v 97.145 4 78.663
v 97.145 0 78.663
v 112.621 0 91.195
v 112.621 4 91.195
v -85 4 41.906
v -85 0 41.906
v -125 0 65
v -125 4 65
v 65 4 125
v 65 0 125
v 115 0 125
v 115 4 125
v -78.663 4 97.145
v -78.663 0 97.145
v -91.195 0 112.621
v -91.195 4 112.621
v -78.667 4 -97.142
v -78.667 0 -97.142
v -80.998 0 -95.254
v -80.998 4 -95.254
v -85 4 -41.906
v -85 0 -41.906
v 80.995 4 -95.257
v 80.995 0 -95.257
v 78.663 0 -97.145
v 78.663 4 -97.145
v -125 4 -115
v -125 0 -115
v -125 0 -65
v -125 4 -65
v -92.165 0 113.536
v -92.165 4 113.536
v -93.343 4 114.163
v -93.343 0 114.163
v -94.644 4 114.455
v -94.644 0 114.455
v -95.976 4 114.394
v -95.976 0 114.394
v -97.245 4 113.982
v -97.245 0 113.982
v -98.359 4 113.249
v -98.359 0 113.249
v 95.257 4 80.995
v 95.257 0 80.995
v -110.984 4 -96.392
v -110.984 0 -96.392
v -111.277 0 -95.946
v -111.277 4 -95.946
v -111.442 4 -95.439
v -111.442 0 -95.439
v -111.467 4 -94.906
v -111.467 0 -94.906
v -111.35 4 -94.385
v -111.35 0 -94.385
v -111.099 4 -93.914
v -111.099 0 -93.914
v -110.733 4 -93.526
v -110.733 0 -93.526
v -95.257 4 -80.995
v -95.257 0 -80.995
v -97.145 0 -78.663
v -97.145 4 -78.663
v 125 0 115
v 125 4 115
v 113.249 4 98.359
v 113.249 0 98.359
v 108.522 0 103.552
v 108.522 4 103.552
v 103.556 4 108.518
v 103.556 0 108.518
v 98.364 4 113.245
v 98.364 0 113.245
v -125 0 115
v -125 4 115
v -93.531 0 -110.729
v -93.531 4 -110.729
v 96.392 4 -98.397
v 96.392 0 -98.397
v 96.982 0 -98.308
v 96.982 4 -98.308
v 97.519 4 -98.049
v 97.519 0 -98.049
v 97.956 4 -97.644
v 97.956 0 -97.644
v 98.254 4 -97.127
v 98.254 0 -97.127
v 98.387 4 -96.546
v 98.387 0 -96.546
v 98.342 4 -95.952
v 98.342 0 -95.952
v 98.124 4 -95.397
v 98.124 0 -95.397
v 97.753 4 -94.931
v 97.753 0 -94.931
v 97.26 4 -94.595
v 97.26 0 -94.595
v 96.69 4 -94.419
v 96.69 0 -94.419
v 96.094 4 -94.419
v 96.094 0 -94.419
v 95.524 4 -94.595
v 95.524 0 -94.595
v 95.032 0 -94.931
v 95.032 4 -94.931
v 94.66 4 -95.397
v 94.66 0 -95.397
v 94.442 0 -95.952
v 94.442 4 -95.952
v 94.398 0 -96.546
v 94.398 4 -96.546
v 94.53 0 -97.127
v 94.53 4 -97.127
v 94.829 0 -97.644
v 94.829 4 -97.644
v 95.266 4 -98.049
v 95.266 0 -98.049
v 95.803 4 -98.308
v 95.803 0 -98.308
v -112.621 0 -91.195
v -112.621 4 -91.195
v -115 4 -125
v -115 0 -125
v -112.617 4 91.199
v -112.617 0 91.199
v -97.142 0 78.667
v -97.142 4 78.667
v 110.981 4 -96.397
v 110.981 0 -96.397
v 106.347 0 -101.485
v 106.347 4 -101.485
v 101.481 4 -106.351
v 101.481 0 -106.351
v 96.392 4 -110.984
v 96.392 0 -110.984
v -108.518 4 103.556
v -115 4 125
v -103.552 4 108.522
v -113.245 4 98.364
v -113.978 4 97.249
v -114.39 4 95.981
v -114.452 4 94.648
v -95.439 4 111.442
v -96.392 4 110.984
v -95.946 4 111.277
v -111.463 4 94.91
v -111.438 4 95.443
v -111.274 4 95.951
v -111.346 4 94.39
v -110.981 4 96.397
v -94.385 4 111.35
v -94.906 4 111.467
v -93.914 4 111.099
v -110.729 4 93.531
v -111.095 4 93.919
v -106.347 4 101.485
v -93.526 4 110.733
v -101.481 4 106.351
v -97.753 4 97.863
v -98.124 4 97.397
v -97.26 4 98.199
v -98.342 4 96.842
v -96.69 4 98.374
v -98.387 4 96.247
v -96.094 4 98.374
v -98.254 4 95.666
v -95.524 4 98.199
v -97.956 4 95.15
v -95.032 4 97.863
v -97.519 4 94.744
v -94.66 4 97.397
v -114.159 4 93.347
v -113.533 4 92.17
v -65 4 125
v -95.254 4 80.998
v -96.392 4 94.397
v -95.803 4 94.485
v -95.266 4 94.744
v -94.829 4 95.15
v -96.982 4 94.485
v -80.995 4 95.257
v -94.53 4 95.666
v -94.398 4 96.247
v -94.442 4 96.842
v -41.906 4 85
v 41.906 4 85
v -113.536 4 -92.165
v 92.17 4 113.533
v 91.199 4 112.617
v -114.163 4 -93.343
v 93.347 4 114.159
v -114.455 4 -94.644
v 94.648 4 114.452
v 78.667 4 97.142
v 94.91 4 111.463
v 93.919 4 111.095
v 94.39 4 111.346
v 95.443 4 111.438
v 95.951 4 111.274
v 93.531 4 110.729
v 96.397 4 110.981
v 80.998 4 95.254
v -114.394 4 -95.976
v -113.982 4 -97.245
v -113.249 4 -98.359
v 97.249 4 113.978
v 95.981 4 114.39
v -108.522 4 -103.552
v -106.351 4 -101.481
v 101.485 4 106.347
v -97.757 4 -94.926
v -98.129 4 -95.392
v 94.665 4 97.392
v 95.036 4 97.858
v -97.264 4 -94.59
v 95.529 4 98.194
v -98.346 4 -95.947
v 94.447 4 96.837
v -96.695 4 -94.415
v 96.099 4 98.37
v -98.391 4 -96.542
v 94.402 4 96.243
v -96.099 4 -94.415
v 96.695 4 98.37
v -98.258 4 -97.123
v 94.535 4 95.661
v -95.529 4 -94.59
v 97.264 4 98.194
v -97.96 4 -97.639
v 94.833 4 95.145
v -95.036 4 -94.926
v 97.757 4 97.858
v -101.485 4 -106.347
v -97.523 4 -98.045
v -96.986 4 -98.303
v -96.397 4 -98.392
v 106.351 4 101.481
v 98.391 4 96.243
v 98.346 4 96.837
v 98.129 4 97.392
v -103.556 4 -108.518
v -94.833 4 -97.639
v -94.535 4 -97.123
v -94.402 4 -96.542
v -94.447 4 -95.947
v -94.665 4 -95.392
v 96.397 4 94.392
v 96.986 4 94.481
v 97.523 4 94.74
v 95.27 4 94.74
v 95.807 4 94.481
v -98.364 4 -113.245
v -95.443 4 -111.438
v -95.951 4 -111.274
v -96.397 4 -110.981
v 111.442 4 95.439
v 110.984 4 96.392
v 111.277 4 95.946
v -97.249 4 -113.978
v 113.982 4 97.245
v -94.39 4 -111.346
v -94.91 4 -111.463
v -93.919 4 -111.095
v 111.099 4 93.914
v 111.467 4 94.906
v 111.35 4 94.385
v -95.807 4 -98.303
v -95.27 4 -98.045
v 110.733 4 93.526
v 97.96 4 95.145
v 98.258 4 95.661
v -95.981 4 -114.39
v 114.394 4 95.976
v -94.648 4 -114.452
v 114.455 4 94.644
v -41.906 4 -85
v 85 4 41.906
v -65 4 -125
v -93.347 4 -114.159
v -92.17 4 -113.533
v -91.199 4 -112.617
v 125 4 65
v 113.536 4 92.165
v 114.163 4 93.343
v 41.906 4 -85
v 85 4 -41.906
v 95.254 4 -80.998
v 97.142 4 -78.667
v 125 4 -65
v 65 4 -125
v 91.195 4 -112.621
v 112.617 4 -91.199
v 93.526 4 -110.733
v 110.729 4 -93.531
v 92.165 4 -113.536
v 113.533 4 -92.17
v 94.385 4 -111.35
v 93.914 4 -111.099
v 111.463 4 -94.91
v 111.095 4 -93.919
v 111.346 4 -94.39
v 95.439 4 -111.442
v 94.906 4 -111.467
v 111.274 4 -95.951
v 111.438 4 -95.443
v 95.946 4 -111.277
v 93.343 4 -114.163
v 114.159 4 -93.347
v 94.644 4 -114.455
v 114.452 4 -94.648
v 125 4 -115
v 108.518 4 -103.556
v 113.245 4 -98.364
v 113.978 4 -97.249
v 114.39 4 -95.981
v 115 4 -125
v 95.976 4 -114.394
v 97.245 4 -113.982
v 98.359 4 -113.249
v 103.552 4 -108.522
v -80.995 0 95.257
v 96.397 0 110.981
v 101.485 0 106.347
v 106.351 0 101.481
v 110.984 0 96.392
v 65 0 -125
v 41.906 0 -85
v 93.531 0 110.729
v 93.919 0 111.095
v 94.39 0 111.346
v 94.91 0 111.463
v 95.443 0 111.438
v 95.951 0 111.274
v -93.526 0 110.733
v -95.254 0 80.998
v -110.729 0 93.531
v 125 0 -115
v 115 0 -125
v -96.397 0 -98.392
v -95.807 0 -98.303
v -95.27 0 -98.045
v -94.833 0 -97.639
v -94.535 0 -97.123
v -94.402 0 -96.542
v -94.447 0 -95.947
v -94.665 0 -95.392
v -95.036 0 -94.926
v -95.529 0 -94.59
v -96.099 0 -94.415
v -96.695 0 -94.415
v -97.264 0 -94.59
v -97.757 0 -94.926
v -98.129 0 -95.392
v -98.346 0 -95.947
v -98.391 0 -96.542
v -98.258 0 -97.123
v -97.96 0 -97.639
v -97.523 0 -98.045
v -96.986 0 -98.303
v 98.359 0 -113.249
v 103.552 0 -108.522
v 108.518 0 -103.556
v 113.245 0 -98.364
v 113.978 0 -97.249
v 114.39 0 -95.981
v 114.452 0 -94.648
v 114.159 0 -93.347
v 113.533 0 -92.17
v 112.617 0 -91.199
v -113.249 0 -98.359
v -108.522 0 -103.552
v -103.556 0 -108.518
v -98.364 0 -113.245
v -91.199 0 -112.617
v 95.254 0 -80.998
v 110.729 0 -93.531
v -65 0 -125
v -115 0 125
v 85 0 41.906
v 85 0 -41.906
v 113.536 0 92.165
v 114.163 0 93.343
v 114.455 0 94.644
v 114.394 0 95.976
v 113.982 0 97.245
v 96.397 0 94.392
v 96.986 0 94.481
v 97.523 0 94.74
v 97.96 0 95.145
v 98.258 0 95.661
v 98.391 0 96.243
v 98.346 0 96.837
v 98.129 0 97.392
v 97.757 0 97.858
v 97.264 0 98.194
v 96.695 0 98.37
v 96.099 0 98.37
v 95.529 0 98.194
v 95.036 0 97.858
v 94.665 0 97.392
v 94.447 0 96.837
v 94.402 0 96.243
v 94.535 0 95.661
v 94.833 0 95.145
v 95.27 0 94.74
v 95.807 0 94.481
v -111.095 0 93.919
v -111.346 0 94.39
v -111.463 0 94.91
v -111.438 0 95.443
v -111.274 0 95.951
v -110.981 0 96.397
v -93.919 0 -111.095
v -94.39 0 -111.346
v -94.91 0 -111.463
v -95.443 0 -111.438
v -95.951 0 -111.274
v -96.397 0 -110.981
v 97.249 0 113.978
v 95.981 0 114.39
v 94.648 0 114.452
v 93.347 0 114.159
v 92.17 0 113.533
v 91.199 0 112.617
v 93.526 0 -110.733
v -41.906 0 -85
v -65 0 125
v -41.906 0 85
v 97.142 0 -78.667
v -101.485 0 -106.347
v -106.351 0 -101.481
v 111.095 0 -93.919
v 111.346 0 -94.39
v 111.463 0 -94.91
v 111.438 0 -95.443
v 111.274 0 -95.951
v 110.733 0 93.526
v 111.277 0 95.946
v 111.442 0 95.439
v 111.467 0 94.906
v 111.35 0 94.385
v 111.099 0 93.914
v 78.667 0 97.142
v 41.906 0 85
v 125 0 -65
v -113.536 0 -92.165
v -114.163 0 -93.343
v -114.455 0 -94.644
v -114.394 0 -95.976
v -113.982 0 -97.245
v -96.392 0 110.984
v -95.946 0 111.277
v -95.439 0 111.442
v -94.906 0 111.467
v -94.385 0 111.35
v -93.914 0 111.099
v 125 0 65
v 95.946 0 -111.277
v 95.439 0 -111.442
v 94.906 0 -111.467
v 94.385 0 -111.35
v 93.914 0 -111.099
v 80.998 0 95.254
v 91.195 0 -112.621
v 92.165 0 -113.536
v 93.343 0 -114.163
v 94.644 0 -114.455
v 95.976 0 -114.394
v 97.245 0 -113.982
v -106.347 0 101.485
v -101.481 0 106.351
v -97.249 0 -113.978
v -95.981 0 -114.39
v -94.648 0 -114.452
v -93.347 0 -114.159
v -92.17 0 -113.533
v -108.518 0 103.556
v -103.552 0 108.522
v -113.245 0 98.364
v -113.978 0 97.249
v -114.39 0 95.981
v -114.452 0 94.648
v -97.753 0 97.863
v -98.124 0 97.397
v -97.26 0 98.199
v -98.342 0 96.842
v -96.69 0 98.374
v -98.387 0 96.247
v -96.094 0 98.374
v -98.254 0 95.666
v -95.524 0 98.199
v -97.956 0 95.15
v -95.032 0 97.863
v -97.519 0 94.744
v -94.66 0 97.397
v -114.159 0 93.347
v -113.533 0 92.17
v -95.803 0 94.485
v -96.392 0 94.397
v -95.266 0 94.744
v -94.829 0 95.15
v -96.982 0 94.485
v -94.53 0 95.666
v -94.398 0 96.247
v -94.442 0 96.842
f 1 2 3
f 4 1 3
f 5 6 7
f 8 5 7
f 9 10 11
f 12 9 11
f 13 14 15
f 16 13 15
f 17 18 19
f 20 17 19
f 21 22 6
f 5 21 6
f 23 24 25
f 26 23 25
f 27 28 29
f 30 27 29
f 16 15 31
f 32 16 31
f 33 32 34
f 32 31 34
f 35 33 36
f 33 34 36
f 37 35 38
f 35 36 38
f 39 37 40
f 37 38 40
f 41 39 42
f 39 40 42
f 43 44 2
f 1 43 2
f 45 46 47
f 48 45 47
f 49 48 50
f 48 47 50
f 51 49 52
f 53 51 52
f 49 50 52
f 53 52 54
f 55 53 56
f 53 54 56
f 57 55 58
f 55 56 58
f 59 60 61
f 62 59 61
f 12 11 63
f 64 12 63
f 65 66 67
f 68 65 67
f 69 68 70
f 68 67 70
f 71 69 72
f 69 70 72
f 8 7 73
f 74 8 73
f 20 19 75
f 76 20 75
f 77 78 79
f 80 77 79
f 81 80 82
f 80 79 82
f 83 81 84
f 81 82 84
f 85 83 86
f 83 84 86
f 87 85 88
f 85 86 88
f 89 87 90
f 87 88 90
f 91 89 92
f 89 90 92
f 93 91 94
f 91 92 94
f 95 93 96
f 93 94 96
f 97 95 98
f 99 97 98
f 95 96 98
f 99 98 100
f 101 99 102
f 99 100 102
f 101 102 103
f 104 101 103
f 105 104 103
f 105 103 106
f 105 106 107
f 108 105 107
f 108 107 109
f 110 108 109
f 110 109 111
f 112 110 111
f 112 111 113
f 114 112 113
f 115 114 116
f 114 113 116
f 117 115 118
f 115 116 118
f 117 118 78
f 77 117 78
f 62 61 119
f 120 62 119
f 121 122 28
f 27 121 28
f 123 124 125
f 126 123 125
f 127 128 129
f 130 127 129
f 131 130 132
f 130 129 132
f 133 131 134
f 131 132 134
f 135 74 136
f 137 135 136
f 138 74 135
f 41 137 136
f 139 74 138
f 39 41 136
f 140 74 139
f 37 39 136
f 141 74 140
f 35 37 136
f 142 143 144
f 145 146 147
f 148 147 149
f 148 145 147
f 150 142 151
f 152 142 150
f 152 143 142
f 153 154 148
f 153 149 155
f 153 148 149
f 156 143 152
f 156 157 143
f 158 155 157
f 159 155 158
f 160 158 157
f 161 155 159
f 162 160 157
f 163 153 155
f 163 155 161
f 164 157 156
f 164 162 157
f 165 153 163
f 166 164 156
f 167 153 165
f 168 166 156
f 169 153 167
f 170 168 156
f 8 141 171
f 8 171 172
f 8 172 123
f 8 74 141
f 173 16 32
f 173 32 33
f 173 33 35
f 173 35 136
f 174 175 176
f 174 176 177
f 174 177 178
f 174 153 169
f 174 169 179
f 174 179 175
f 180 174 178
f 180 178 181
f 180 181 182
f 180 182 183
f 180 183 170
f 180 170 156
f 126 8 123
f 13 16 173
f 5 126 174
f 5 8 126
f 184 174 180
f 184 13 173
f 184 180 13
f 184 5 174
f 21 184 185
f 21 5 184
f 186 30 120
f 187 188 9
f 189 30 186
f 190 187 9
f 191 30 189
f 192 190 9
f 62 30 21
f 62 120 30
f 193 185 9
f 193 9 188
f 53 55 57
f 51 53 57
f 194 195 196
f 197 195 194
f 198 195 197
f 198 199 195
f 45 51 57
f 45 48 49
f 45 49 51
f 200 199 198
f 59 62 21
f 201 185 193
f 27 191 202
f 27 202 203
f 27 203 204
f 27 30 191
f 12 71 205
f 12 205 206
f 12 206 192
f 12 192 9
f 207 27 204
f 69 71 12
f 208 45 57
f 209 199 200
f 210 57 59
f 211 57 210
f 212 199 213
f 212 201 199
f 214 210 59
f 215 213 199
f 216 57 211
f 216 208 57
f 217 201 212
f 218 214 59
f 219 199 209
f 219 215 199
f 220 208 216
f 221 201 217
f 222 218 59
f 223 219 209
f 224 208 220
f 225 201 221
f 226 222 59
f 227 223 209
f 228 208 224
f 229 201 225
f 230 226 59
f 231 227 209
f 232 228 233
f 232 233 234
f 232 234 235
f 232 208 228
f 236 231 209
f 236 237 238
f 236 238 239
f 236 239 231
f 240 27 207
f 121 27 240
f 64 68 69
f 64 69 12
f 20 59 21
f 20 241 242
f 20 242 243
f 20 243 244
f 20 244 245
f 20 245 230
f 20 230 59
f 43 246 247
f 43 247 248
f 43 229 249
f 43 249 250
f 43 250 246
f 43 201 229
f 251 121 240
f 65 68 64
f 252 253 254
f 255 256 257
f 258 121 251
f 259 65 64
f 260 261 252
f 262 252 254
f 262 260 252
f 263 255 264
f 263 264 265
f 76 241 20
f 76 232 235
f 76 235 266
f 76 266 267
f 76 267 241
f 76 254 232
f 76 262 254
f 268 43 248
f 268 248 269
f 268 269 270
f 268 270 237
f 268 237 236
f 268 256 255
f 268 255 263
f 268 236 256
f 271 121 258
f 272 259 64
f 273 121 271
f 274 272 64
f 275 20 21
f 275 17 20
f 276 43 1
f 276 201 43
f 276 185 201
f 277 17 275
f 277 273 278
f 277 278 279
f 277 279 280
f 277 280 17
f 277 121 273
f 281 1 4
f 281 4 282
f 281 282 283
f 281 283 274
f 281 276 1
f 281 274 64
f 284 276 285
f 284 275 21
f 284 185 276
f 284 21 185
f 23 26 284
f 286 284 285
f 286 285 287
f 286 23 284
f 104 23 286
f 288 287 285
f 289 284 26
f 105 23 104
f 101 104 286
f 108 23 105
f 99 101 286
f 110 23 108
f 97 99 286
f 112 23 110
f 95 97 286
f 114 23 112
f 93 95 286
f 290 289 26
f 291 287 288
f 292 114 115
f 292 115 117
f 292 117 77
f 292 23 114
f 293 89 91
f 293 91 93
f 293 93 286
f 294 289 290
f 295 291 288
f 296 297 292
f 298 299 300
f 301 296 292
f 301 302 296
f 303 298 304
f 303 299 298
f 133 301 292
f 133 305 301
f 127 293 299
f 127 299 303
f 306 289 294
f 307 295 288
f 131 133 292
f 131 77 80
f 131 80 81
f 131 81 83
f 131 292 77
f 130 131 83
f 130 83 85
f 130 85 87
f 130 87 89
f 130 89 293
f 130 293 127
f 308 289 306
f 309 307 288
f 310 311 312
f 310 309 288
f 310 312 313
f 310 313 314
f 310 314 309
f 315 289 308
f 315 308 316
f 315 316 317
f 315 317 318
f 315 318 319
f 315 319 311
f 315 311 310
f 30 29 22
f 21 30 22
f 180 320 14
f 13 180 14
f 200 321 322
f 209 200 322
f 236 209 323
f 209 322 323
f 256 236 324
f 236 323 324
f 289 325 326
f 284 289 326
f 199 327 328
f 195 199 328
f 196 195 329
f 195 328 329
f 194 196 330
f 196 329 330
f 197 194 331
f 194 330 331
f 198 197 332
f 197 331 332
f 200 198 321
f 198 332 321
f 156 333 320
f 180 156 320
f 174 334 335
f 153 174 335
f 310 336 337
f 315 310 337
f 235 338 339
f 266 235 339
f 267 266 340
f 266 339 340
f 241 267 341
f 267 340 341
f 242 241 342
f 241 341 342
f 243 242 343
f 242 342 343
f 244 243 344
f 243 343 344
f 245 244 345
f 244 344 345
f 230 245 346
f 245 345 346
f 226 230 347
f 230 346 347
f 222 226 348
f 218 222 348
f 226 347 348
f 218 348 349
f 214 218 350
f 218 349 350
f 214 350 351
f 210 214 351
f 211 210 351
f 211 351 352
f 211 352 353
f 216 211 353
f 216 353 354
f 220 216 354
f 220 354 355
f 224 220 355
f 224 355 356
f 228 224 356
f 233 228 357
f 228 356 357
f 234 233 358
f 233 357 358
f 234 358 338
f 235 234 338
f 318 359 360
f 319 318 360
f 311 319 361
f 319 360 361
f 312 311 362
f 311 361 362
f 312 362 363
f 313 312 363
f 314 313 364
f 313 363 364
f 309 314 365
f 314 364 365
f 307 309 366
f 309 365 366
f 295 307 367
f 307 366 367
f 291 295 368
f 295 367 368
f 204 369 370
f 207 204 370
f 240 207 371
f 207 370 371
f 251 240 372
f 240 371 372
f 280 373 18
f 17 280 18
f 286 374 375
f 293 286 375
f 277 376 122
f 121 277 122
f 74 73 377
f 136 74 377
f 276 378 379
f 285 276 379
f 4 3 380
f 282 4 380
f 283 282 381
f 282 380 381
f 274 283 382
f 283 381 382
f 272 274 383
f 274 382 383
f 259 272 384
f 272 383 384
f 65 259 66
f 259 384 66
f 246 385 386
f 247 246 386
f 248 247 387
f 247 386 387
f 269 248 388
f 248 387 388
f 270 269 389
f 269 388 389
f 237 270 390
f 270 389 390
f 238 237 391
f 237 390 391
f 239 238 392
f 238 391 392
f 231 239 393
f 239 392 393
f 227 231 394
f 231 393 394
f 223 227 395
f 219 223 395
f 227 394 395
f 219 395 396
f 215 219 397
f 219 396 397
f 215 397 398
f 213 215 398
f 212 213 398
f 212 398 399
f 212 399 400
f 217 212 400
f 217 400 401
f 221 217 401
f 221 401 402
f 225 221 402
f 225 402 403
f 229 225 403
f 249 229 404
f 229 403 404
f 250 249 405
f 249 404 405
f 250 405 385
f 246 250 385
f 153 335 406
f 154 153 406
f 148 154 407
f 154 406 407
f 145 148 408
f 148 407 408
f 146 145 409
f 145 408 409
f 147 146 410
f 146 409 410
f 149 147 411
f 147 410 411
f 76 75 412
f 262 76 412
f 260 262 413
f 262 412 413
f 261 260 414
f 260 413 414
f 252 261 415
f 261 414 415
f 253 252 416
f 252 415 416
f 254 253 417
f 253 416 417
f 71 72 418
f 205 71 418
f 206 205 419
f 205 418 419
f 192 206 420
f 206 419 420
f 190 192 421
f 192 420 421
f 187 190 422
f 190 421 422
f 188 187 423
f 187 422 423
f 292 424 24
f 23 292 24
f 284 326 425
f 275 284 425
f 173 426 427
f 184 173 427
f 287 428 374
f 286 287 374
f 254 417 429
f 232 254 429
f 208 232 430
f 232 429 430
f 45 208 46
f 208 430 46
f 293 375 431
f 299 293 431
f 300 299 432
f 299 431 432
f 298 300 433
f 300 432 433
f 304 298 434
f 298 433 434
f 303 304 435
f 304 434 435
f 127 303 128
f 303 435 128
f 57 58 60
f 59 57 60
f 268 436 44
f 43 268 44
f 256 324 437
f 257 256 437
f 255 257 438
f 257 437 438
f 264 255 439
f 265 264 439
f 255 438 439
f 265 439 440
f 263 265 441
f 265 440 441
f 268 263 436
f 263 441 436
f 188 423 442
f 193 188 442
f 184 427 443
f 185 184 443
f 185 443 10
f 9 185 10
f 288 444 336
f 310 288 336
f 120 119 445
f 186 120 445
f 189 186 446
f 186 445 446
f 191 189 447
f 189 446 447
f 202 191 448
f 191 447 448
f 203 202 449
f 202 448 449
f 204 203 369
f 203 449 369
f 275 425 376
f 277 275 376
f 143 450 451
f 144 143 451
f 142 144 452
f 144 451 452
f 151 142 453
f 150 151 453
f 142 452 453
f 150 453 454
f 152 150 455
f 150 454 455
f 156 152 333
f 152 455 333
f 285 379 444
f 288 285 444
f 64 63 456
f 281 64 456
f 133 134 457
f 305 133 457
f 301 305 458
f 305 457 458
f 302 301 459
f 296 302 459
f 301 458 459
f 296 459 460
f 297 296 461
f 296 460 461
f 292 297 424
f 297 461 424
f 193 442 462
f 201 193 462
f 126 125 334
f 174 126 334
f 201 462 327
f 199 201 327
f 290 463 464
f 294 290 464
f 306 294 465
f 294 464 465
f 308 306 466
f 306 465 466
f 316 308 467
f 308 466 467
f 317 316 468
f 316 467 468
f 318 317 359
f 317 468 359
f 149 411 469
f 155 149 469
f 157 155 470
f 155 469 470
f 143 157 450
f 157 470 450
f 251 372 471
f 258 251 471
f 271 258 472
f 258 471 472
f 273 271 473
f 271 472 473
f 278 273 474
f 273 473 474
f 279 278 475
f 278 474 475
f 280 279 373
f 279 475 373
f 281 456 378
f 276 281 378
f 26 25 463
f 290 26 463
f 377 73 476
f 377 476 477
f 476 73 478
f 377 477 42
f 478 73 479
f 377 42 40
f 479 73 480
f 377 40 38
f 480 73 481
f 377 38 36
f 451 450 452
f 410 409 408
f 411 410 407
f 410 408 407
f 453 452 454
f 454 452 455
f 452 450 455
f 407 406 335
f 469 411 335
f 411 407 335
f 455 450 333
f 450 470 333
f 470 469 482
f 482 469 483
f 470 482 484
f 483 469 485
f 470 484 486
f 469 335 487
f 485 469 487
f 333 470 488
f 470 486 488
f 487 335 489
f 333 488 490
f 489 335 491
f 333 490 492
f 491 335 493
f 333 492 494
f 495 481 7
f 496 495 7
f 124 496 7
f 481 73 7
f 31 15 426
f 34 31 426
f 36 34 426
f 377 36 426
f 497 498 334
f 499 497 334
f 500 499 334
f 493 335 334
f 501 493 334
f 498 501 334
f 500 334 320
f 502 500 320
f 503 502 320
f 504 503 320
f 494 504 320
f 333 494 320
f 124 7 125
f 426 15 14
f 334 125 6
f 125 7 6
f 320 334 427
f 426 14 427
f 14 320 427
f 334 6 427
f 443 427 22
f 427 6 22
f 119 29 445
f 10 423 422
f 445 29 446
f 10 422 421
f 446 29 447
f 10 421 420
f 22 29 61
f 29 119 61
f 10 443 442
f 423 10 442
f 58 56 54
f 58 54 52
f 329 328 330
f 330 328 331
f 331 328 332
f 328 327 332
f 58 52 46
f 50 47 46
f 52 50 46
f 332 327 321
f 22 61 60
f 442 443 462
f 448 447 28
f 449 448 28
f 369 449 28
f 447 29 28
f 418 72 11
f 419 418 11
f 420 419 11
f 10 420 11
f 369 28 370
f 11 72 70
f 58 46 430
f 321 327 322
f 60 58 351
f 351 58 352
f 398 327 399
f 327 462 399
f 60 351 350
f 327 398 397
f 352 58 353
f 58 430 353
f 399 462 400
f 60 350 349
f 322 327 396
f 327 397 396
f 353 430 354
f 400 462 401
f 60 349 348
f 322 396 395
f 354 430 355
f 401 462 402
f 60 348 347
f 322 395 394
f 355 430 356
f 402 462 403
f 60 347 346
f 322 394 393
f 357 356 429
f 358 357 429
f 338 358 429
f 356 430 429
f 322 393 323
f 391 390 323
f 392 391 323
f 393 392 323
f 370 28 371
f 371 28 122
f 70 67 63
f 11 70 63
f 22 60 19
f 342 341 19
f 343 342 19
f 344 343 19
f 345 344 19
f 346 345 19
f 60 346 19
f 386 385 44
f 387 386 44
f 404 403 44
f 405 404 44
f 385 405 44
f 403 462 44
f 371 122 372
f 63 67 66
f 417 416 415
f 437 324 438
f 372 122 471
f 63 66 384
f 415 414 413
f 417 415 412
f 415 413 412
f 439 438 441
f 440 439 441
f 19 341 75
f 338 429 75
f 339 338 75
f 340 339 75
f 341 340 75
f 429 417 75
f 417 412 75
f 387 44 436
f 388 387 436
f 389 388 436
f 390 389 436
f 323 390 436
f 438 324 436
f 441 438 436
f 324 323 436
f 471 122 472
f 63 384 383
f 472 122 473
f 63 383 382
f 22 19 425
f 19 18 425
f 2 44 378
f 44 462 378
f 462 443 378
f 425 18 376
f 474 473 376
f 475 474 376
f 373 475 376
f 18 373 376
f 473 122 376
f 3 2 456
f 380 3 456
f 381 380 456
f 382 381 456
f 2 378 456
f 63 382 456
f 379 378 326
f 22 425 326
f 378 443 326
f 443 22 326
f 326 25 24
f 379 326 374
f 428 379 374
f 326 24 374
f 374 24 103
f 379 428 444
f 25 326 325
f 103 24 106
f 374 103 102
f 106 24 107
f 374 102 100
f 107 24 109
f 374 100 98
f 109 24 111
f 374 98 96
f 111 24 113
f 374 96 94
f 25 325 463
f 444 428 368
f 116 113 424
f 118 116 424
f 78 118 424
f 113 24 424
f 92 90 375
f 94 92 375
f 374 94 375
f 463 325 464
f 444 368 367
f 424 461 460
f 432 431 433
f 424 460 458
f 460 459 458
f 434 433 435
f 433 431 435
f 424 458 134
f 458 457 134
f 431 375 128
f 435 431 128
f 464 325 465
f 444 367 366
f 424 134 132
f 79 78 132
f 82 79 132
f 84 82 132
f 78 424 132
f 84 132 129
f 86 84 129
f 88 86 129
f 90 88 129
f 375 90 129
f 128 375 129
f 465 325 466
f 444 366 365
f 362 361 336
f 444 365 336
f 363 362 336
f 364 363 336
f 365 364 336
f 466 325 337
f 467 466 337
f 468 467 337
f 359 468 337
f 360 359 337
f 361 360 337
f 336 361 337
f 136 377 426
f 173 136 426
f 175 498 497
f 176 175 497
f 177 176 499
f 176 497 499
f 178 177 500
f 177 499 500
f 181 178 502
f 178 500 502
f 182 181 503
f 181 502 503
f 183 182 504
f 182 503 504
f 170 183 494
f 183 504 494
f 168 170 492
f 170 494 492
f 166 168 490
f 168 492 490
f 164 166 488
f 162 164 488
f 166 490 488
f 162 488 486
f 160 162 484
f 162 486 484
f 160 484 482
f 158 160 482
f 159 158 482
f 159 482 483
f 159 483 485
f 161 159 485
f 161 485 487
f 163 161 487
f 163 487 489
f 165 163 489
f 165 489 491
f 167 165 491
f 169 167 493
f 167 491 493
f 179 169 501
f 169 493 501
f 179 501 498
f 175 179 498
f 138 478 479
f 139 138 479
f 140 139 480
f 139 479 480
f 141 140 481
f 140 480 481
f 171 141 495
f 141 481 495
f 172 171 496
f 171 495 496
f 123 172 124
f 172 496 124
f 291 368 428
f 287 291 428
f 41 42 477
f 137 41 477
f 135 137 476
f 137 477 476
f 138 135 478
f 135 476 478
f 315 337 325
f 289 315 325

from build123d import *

# Parameters (mm, degrees)
BOSS_EXTRUDE1_DEPTH = 4
SKETCH7_R           = 2
CUT_EXTRUDE1_DEPTH  = 4


with BuildPart() as part:
    # Sketch1 → Boss-Extrude1 (new body)
    with BuildSketch(Plane(origin=(0, 0, 0), x_dir=(1, 0, 0), z_dir=(0, 1, 0))):
        Polygon((-125, 115), (-125, 65), (-85, 41.905989232), (-85, -41.905989232), (-125, -65), (-125, -115), (-115, -125), (-65, -125), (-41.905989232, -85), (41.905989232, -85), (65, -125), (115, -125), (125, -115), (125, -65), (85, -41.905989232), (85, 41.905989232), (125, 65), (125, 115), (115, 125), (65, 125), (41.905989232, 85), (-41.905989232, 85), (-65, 125), (-115, 125), align=None)
    extrude(amount=BOSS_EXTRUDE1_DEPTH)

    # Sketch7 → Cut-Extrude1 (cut)
    with BuildSketch(Plane.XZ):
        with Locations(Location((96.392180149, -96.396634108, 0), (0, 0, 270))):
            Circle(SKETCH7_R)
        with Locations(Location((-96.396634108, -96.392180149, 0), (0, 0, 270))):
            Circle(SKETCH7_R)
        with Locations(Location((-96.392180149, 96.396634108, 0), (0, 0, 270))):
            Circle(SKETCH7_R)
        with Locations(Location((96.396634108, 96.392180149, 0), (0, 0, 270))):
            Circle(SKETCH7_R)
        with BuildLine():
            Line((112.617319154, -91.199448609), (97.141666667, -78.666998145))
            Line((97.141666667, -78.666998145), (95.253658711, -80.998398145))
            Line((95.253658711, -80.998398145), (110.729311198, -93.530848609))
            ThreePointArc((110.729311198, -93.530848609), (111.462995743, -94.910428371), (110.980579079, -96.396634108))
            ThreePointArc((110.980579079, -96.396634108), (103.942611055, -103.946782572), (96.392180149, -110.984447587))
            ThreePointArc((96.392180149, -110.984447587), (94.905955053, -111.466804606), (93.526404737, -110.733064696))
            Line((93.526404737, -110.733064696), (80.994575353, -95.256909268))
            Line((80.994575353, -95.256909268), (78.663099585, -97.144823658))
            Line((78.663099585, -97.144823658), (91.194928969, -112.620979086))
            ThreePointArc((91.194928969, -112.620979086), (94.643804759, -114.455328861), (98.359367499, -113.249436313))
            ThreePointArc((98.359367499, -113.249436313), (106.063888832, -106.068145481), (113.245488856, -98.363912355))
            ThreePointArc((113.245488856, -98.363912355), (114.451530517, -94.648398013), (112.617319154, -91.199448609))
        make_face()
        with BuildLine():
            Line((-91.199448609, -112.617319154), (-78.666998145, -97.141666667))
            Line((-78.666998145, -97.141666667), (-80.998398145, -95.253658711))
            Line((-80.998398145, -95.253658711), (-93.530848609, -110.729311198))
            ThreePointArc((-93.530848609, -110.729311198), (-94.910428371, -111.462995743), (-96.396634108, -110.980579079))
            ThreePointArc((-96.396634108, -110.980579079), (-103.946782572, -103.942611055), (-110.984447587, -96.392180149))
            ThreePointArc((-110.984447587, -96.392180149), (-111.466804606, -94.905955053), (-110.733064696, -93.526404737))
            Line((-110.733064696, -93.526404737), (-95.256909268, -80.994575353))
            Line((-95.256909268, -80.994575353), (-97.144823658, -78.663099585))
            Line((-97.144823658, -78.663099585), (-112.620979086, -91.194928969))
            ThreePointArc((-112.620979086, -91.194928969), (-114.455328861, -94.643804759), (-113.249436313, -98.359367499))
            ThreePointArc((-113.249436313, -98.359367499), (-106.068145481, -106.063888832), (-98.363912355, -113.245488856))
            ThreePointArc((-98.363912355, -113.245488856), (-94.648398013, -114.451530517), (-91.199448609, -112.617319154))
        make_face()
        with BuildLine():
            Line((-112.617319154, 91.199448609), (-97.141666667, 78.666998145))
            Line((-97.141666667, 78.666998145), (-95.253658711, 80.998398145))
            Line((-95.253658711, 80.998398145), (-110.729311198, 93.530848609))
            ThreePointArc((-110.729311198, 93.530848609), (-111.462995743, 94.910428371), (-110.980579079, 96.396634108))
            ThreePointArc((-110.980579079, 96.396634108), (-103.942611055, 103.946782572), (-96.392180149, 110.984447587))
            ThreePointArc((-96.392180149, 110.984447587), (-94.905955053, 111.466804606), (-93.526404737, 110.733064696))
            Line((-93.526404737, 110.733064696), (-80.994575353, 95.256909268))
            Line((-80.994575353, 95.256909268), (-78.663099585, 97.144823658))
            Line((-78.663099585, 97.144823658), (-91.194928969, 112.620979086))
            ThreePointArc((-91.194928969, 112.620979086), (-94.643804759, 114.455328861), (-98.359367499, 113.249436313))
            ThreePointArc((-98.359367499, 113.249436313), (-106.063888832, 106.068145481), (-113.245488856, 98.363912355))
            ThreePointArc((-113.245488856, 98.363912355), (-114.451530517, 94.648398013), (-112.617319154, 91.199448609))
        make_face()
        with BuildLine():
            Line((91.199448609, 112.617319154), (78.666998145, 97.141666667))
            Line((78.666998145, 97.141666667), (80.998398145, 95.253658711))
            Line((80.998398145, 95.253658711), (93.530848609, 110.729311198))
            ThreePointArc((93.530848609, 110.729311198), (94.910428371, 111.462995743), (96.396634108, 110.980579079))
            ThreePointArc((96.396634108, 110.980579079), (103.946782572, 103.942611055), (110.984447587, 96.392180149))
            ThreePointArc((110.984447587, 96.392180149), (111.466804606, 94.905955053), (110.733064696, 93.526404737))
            Line((110.733064696, 93.526404737), (95.256909268, 80.994575353))
            Line((95.256909268, 80.994575353), (97.144823658, 78.663099585))
            Line((97.144823658, 78.663099585), (112.620979086, 91.194928969))
            ThreePointArc((112.620979086, 91.194928969), (114.455328861, 94.643804759), (113.249436313, 98.359367499))
            ThreePointArc((113.249436313, 98.359367499), (106.068145481, 106.063888832), (98.363912355, 113.245488856))
            ThreePointArc((98.363912355, 113.245488856), (94.648398013, 114.451530517), (91.199448609, 112.617319154))
        make_face()
    extrude(amount=-CUT_EXTRUDE1_DEPTH, mode=Mode.SUBTRACT)


solid = part.part
